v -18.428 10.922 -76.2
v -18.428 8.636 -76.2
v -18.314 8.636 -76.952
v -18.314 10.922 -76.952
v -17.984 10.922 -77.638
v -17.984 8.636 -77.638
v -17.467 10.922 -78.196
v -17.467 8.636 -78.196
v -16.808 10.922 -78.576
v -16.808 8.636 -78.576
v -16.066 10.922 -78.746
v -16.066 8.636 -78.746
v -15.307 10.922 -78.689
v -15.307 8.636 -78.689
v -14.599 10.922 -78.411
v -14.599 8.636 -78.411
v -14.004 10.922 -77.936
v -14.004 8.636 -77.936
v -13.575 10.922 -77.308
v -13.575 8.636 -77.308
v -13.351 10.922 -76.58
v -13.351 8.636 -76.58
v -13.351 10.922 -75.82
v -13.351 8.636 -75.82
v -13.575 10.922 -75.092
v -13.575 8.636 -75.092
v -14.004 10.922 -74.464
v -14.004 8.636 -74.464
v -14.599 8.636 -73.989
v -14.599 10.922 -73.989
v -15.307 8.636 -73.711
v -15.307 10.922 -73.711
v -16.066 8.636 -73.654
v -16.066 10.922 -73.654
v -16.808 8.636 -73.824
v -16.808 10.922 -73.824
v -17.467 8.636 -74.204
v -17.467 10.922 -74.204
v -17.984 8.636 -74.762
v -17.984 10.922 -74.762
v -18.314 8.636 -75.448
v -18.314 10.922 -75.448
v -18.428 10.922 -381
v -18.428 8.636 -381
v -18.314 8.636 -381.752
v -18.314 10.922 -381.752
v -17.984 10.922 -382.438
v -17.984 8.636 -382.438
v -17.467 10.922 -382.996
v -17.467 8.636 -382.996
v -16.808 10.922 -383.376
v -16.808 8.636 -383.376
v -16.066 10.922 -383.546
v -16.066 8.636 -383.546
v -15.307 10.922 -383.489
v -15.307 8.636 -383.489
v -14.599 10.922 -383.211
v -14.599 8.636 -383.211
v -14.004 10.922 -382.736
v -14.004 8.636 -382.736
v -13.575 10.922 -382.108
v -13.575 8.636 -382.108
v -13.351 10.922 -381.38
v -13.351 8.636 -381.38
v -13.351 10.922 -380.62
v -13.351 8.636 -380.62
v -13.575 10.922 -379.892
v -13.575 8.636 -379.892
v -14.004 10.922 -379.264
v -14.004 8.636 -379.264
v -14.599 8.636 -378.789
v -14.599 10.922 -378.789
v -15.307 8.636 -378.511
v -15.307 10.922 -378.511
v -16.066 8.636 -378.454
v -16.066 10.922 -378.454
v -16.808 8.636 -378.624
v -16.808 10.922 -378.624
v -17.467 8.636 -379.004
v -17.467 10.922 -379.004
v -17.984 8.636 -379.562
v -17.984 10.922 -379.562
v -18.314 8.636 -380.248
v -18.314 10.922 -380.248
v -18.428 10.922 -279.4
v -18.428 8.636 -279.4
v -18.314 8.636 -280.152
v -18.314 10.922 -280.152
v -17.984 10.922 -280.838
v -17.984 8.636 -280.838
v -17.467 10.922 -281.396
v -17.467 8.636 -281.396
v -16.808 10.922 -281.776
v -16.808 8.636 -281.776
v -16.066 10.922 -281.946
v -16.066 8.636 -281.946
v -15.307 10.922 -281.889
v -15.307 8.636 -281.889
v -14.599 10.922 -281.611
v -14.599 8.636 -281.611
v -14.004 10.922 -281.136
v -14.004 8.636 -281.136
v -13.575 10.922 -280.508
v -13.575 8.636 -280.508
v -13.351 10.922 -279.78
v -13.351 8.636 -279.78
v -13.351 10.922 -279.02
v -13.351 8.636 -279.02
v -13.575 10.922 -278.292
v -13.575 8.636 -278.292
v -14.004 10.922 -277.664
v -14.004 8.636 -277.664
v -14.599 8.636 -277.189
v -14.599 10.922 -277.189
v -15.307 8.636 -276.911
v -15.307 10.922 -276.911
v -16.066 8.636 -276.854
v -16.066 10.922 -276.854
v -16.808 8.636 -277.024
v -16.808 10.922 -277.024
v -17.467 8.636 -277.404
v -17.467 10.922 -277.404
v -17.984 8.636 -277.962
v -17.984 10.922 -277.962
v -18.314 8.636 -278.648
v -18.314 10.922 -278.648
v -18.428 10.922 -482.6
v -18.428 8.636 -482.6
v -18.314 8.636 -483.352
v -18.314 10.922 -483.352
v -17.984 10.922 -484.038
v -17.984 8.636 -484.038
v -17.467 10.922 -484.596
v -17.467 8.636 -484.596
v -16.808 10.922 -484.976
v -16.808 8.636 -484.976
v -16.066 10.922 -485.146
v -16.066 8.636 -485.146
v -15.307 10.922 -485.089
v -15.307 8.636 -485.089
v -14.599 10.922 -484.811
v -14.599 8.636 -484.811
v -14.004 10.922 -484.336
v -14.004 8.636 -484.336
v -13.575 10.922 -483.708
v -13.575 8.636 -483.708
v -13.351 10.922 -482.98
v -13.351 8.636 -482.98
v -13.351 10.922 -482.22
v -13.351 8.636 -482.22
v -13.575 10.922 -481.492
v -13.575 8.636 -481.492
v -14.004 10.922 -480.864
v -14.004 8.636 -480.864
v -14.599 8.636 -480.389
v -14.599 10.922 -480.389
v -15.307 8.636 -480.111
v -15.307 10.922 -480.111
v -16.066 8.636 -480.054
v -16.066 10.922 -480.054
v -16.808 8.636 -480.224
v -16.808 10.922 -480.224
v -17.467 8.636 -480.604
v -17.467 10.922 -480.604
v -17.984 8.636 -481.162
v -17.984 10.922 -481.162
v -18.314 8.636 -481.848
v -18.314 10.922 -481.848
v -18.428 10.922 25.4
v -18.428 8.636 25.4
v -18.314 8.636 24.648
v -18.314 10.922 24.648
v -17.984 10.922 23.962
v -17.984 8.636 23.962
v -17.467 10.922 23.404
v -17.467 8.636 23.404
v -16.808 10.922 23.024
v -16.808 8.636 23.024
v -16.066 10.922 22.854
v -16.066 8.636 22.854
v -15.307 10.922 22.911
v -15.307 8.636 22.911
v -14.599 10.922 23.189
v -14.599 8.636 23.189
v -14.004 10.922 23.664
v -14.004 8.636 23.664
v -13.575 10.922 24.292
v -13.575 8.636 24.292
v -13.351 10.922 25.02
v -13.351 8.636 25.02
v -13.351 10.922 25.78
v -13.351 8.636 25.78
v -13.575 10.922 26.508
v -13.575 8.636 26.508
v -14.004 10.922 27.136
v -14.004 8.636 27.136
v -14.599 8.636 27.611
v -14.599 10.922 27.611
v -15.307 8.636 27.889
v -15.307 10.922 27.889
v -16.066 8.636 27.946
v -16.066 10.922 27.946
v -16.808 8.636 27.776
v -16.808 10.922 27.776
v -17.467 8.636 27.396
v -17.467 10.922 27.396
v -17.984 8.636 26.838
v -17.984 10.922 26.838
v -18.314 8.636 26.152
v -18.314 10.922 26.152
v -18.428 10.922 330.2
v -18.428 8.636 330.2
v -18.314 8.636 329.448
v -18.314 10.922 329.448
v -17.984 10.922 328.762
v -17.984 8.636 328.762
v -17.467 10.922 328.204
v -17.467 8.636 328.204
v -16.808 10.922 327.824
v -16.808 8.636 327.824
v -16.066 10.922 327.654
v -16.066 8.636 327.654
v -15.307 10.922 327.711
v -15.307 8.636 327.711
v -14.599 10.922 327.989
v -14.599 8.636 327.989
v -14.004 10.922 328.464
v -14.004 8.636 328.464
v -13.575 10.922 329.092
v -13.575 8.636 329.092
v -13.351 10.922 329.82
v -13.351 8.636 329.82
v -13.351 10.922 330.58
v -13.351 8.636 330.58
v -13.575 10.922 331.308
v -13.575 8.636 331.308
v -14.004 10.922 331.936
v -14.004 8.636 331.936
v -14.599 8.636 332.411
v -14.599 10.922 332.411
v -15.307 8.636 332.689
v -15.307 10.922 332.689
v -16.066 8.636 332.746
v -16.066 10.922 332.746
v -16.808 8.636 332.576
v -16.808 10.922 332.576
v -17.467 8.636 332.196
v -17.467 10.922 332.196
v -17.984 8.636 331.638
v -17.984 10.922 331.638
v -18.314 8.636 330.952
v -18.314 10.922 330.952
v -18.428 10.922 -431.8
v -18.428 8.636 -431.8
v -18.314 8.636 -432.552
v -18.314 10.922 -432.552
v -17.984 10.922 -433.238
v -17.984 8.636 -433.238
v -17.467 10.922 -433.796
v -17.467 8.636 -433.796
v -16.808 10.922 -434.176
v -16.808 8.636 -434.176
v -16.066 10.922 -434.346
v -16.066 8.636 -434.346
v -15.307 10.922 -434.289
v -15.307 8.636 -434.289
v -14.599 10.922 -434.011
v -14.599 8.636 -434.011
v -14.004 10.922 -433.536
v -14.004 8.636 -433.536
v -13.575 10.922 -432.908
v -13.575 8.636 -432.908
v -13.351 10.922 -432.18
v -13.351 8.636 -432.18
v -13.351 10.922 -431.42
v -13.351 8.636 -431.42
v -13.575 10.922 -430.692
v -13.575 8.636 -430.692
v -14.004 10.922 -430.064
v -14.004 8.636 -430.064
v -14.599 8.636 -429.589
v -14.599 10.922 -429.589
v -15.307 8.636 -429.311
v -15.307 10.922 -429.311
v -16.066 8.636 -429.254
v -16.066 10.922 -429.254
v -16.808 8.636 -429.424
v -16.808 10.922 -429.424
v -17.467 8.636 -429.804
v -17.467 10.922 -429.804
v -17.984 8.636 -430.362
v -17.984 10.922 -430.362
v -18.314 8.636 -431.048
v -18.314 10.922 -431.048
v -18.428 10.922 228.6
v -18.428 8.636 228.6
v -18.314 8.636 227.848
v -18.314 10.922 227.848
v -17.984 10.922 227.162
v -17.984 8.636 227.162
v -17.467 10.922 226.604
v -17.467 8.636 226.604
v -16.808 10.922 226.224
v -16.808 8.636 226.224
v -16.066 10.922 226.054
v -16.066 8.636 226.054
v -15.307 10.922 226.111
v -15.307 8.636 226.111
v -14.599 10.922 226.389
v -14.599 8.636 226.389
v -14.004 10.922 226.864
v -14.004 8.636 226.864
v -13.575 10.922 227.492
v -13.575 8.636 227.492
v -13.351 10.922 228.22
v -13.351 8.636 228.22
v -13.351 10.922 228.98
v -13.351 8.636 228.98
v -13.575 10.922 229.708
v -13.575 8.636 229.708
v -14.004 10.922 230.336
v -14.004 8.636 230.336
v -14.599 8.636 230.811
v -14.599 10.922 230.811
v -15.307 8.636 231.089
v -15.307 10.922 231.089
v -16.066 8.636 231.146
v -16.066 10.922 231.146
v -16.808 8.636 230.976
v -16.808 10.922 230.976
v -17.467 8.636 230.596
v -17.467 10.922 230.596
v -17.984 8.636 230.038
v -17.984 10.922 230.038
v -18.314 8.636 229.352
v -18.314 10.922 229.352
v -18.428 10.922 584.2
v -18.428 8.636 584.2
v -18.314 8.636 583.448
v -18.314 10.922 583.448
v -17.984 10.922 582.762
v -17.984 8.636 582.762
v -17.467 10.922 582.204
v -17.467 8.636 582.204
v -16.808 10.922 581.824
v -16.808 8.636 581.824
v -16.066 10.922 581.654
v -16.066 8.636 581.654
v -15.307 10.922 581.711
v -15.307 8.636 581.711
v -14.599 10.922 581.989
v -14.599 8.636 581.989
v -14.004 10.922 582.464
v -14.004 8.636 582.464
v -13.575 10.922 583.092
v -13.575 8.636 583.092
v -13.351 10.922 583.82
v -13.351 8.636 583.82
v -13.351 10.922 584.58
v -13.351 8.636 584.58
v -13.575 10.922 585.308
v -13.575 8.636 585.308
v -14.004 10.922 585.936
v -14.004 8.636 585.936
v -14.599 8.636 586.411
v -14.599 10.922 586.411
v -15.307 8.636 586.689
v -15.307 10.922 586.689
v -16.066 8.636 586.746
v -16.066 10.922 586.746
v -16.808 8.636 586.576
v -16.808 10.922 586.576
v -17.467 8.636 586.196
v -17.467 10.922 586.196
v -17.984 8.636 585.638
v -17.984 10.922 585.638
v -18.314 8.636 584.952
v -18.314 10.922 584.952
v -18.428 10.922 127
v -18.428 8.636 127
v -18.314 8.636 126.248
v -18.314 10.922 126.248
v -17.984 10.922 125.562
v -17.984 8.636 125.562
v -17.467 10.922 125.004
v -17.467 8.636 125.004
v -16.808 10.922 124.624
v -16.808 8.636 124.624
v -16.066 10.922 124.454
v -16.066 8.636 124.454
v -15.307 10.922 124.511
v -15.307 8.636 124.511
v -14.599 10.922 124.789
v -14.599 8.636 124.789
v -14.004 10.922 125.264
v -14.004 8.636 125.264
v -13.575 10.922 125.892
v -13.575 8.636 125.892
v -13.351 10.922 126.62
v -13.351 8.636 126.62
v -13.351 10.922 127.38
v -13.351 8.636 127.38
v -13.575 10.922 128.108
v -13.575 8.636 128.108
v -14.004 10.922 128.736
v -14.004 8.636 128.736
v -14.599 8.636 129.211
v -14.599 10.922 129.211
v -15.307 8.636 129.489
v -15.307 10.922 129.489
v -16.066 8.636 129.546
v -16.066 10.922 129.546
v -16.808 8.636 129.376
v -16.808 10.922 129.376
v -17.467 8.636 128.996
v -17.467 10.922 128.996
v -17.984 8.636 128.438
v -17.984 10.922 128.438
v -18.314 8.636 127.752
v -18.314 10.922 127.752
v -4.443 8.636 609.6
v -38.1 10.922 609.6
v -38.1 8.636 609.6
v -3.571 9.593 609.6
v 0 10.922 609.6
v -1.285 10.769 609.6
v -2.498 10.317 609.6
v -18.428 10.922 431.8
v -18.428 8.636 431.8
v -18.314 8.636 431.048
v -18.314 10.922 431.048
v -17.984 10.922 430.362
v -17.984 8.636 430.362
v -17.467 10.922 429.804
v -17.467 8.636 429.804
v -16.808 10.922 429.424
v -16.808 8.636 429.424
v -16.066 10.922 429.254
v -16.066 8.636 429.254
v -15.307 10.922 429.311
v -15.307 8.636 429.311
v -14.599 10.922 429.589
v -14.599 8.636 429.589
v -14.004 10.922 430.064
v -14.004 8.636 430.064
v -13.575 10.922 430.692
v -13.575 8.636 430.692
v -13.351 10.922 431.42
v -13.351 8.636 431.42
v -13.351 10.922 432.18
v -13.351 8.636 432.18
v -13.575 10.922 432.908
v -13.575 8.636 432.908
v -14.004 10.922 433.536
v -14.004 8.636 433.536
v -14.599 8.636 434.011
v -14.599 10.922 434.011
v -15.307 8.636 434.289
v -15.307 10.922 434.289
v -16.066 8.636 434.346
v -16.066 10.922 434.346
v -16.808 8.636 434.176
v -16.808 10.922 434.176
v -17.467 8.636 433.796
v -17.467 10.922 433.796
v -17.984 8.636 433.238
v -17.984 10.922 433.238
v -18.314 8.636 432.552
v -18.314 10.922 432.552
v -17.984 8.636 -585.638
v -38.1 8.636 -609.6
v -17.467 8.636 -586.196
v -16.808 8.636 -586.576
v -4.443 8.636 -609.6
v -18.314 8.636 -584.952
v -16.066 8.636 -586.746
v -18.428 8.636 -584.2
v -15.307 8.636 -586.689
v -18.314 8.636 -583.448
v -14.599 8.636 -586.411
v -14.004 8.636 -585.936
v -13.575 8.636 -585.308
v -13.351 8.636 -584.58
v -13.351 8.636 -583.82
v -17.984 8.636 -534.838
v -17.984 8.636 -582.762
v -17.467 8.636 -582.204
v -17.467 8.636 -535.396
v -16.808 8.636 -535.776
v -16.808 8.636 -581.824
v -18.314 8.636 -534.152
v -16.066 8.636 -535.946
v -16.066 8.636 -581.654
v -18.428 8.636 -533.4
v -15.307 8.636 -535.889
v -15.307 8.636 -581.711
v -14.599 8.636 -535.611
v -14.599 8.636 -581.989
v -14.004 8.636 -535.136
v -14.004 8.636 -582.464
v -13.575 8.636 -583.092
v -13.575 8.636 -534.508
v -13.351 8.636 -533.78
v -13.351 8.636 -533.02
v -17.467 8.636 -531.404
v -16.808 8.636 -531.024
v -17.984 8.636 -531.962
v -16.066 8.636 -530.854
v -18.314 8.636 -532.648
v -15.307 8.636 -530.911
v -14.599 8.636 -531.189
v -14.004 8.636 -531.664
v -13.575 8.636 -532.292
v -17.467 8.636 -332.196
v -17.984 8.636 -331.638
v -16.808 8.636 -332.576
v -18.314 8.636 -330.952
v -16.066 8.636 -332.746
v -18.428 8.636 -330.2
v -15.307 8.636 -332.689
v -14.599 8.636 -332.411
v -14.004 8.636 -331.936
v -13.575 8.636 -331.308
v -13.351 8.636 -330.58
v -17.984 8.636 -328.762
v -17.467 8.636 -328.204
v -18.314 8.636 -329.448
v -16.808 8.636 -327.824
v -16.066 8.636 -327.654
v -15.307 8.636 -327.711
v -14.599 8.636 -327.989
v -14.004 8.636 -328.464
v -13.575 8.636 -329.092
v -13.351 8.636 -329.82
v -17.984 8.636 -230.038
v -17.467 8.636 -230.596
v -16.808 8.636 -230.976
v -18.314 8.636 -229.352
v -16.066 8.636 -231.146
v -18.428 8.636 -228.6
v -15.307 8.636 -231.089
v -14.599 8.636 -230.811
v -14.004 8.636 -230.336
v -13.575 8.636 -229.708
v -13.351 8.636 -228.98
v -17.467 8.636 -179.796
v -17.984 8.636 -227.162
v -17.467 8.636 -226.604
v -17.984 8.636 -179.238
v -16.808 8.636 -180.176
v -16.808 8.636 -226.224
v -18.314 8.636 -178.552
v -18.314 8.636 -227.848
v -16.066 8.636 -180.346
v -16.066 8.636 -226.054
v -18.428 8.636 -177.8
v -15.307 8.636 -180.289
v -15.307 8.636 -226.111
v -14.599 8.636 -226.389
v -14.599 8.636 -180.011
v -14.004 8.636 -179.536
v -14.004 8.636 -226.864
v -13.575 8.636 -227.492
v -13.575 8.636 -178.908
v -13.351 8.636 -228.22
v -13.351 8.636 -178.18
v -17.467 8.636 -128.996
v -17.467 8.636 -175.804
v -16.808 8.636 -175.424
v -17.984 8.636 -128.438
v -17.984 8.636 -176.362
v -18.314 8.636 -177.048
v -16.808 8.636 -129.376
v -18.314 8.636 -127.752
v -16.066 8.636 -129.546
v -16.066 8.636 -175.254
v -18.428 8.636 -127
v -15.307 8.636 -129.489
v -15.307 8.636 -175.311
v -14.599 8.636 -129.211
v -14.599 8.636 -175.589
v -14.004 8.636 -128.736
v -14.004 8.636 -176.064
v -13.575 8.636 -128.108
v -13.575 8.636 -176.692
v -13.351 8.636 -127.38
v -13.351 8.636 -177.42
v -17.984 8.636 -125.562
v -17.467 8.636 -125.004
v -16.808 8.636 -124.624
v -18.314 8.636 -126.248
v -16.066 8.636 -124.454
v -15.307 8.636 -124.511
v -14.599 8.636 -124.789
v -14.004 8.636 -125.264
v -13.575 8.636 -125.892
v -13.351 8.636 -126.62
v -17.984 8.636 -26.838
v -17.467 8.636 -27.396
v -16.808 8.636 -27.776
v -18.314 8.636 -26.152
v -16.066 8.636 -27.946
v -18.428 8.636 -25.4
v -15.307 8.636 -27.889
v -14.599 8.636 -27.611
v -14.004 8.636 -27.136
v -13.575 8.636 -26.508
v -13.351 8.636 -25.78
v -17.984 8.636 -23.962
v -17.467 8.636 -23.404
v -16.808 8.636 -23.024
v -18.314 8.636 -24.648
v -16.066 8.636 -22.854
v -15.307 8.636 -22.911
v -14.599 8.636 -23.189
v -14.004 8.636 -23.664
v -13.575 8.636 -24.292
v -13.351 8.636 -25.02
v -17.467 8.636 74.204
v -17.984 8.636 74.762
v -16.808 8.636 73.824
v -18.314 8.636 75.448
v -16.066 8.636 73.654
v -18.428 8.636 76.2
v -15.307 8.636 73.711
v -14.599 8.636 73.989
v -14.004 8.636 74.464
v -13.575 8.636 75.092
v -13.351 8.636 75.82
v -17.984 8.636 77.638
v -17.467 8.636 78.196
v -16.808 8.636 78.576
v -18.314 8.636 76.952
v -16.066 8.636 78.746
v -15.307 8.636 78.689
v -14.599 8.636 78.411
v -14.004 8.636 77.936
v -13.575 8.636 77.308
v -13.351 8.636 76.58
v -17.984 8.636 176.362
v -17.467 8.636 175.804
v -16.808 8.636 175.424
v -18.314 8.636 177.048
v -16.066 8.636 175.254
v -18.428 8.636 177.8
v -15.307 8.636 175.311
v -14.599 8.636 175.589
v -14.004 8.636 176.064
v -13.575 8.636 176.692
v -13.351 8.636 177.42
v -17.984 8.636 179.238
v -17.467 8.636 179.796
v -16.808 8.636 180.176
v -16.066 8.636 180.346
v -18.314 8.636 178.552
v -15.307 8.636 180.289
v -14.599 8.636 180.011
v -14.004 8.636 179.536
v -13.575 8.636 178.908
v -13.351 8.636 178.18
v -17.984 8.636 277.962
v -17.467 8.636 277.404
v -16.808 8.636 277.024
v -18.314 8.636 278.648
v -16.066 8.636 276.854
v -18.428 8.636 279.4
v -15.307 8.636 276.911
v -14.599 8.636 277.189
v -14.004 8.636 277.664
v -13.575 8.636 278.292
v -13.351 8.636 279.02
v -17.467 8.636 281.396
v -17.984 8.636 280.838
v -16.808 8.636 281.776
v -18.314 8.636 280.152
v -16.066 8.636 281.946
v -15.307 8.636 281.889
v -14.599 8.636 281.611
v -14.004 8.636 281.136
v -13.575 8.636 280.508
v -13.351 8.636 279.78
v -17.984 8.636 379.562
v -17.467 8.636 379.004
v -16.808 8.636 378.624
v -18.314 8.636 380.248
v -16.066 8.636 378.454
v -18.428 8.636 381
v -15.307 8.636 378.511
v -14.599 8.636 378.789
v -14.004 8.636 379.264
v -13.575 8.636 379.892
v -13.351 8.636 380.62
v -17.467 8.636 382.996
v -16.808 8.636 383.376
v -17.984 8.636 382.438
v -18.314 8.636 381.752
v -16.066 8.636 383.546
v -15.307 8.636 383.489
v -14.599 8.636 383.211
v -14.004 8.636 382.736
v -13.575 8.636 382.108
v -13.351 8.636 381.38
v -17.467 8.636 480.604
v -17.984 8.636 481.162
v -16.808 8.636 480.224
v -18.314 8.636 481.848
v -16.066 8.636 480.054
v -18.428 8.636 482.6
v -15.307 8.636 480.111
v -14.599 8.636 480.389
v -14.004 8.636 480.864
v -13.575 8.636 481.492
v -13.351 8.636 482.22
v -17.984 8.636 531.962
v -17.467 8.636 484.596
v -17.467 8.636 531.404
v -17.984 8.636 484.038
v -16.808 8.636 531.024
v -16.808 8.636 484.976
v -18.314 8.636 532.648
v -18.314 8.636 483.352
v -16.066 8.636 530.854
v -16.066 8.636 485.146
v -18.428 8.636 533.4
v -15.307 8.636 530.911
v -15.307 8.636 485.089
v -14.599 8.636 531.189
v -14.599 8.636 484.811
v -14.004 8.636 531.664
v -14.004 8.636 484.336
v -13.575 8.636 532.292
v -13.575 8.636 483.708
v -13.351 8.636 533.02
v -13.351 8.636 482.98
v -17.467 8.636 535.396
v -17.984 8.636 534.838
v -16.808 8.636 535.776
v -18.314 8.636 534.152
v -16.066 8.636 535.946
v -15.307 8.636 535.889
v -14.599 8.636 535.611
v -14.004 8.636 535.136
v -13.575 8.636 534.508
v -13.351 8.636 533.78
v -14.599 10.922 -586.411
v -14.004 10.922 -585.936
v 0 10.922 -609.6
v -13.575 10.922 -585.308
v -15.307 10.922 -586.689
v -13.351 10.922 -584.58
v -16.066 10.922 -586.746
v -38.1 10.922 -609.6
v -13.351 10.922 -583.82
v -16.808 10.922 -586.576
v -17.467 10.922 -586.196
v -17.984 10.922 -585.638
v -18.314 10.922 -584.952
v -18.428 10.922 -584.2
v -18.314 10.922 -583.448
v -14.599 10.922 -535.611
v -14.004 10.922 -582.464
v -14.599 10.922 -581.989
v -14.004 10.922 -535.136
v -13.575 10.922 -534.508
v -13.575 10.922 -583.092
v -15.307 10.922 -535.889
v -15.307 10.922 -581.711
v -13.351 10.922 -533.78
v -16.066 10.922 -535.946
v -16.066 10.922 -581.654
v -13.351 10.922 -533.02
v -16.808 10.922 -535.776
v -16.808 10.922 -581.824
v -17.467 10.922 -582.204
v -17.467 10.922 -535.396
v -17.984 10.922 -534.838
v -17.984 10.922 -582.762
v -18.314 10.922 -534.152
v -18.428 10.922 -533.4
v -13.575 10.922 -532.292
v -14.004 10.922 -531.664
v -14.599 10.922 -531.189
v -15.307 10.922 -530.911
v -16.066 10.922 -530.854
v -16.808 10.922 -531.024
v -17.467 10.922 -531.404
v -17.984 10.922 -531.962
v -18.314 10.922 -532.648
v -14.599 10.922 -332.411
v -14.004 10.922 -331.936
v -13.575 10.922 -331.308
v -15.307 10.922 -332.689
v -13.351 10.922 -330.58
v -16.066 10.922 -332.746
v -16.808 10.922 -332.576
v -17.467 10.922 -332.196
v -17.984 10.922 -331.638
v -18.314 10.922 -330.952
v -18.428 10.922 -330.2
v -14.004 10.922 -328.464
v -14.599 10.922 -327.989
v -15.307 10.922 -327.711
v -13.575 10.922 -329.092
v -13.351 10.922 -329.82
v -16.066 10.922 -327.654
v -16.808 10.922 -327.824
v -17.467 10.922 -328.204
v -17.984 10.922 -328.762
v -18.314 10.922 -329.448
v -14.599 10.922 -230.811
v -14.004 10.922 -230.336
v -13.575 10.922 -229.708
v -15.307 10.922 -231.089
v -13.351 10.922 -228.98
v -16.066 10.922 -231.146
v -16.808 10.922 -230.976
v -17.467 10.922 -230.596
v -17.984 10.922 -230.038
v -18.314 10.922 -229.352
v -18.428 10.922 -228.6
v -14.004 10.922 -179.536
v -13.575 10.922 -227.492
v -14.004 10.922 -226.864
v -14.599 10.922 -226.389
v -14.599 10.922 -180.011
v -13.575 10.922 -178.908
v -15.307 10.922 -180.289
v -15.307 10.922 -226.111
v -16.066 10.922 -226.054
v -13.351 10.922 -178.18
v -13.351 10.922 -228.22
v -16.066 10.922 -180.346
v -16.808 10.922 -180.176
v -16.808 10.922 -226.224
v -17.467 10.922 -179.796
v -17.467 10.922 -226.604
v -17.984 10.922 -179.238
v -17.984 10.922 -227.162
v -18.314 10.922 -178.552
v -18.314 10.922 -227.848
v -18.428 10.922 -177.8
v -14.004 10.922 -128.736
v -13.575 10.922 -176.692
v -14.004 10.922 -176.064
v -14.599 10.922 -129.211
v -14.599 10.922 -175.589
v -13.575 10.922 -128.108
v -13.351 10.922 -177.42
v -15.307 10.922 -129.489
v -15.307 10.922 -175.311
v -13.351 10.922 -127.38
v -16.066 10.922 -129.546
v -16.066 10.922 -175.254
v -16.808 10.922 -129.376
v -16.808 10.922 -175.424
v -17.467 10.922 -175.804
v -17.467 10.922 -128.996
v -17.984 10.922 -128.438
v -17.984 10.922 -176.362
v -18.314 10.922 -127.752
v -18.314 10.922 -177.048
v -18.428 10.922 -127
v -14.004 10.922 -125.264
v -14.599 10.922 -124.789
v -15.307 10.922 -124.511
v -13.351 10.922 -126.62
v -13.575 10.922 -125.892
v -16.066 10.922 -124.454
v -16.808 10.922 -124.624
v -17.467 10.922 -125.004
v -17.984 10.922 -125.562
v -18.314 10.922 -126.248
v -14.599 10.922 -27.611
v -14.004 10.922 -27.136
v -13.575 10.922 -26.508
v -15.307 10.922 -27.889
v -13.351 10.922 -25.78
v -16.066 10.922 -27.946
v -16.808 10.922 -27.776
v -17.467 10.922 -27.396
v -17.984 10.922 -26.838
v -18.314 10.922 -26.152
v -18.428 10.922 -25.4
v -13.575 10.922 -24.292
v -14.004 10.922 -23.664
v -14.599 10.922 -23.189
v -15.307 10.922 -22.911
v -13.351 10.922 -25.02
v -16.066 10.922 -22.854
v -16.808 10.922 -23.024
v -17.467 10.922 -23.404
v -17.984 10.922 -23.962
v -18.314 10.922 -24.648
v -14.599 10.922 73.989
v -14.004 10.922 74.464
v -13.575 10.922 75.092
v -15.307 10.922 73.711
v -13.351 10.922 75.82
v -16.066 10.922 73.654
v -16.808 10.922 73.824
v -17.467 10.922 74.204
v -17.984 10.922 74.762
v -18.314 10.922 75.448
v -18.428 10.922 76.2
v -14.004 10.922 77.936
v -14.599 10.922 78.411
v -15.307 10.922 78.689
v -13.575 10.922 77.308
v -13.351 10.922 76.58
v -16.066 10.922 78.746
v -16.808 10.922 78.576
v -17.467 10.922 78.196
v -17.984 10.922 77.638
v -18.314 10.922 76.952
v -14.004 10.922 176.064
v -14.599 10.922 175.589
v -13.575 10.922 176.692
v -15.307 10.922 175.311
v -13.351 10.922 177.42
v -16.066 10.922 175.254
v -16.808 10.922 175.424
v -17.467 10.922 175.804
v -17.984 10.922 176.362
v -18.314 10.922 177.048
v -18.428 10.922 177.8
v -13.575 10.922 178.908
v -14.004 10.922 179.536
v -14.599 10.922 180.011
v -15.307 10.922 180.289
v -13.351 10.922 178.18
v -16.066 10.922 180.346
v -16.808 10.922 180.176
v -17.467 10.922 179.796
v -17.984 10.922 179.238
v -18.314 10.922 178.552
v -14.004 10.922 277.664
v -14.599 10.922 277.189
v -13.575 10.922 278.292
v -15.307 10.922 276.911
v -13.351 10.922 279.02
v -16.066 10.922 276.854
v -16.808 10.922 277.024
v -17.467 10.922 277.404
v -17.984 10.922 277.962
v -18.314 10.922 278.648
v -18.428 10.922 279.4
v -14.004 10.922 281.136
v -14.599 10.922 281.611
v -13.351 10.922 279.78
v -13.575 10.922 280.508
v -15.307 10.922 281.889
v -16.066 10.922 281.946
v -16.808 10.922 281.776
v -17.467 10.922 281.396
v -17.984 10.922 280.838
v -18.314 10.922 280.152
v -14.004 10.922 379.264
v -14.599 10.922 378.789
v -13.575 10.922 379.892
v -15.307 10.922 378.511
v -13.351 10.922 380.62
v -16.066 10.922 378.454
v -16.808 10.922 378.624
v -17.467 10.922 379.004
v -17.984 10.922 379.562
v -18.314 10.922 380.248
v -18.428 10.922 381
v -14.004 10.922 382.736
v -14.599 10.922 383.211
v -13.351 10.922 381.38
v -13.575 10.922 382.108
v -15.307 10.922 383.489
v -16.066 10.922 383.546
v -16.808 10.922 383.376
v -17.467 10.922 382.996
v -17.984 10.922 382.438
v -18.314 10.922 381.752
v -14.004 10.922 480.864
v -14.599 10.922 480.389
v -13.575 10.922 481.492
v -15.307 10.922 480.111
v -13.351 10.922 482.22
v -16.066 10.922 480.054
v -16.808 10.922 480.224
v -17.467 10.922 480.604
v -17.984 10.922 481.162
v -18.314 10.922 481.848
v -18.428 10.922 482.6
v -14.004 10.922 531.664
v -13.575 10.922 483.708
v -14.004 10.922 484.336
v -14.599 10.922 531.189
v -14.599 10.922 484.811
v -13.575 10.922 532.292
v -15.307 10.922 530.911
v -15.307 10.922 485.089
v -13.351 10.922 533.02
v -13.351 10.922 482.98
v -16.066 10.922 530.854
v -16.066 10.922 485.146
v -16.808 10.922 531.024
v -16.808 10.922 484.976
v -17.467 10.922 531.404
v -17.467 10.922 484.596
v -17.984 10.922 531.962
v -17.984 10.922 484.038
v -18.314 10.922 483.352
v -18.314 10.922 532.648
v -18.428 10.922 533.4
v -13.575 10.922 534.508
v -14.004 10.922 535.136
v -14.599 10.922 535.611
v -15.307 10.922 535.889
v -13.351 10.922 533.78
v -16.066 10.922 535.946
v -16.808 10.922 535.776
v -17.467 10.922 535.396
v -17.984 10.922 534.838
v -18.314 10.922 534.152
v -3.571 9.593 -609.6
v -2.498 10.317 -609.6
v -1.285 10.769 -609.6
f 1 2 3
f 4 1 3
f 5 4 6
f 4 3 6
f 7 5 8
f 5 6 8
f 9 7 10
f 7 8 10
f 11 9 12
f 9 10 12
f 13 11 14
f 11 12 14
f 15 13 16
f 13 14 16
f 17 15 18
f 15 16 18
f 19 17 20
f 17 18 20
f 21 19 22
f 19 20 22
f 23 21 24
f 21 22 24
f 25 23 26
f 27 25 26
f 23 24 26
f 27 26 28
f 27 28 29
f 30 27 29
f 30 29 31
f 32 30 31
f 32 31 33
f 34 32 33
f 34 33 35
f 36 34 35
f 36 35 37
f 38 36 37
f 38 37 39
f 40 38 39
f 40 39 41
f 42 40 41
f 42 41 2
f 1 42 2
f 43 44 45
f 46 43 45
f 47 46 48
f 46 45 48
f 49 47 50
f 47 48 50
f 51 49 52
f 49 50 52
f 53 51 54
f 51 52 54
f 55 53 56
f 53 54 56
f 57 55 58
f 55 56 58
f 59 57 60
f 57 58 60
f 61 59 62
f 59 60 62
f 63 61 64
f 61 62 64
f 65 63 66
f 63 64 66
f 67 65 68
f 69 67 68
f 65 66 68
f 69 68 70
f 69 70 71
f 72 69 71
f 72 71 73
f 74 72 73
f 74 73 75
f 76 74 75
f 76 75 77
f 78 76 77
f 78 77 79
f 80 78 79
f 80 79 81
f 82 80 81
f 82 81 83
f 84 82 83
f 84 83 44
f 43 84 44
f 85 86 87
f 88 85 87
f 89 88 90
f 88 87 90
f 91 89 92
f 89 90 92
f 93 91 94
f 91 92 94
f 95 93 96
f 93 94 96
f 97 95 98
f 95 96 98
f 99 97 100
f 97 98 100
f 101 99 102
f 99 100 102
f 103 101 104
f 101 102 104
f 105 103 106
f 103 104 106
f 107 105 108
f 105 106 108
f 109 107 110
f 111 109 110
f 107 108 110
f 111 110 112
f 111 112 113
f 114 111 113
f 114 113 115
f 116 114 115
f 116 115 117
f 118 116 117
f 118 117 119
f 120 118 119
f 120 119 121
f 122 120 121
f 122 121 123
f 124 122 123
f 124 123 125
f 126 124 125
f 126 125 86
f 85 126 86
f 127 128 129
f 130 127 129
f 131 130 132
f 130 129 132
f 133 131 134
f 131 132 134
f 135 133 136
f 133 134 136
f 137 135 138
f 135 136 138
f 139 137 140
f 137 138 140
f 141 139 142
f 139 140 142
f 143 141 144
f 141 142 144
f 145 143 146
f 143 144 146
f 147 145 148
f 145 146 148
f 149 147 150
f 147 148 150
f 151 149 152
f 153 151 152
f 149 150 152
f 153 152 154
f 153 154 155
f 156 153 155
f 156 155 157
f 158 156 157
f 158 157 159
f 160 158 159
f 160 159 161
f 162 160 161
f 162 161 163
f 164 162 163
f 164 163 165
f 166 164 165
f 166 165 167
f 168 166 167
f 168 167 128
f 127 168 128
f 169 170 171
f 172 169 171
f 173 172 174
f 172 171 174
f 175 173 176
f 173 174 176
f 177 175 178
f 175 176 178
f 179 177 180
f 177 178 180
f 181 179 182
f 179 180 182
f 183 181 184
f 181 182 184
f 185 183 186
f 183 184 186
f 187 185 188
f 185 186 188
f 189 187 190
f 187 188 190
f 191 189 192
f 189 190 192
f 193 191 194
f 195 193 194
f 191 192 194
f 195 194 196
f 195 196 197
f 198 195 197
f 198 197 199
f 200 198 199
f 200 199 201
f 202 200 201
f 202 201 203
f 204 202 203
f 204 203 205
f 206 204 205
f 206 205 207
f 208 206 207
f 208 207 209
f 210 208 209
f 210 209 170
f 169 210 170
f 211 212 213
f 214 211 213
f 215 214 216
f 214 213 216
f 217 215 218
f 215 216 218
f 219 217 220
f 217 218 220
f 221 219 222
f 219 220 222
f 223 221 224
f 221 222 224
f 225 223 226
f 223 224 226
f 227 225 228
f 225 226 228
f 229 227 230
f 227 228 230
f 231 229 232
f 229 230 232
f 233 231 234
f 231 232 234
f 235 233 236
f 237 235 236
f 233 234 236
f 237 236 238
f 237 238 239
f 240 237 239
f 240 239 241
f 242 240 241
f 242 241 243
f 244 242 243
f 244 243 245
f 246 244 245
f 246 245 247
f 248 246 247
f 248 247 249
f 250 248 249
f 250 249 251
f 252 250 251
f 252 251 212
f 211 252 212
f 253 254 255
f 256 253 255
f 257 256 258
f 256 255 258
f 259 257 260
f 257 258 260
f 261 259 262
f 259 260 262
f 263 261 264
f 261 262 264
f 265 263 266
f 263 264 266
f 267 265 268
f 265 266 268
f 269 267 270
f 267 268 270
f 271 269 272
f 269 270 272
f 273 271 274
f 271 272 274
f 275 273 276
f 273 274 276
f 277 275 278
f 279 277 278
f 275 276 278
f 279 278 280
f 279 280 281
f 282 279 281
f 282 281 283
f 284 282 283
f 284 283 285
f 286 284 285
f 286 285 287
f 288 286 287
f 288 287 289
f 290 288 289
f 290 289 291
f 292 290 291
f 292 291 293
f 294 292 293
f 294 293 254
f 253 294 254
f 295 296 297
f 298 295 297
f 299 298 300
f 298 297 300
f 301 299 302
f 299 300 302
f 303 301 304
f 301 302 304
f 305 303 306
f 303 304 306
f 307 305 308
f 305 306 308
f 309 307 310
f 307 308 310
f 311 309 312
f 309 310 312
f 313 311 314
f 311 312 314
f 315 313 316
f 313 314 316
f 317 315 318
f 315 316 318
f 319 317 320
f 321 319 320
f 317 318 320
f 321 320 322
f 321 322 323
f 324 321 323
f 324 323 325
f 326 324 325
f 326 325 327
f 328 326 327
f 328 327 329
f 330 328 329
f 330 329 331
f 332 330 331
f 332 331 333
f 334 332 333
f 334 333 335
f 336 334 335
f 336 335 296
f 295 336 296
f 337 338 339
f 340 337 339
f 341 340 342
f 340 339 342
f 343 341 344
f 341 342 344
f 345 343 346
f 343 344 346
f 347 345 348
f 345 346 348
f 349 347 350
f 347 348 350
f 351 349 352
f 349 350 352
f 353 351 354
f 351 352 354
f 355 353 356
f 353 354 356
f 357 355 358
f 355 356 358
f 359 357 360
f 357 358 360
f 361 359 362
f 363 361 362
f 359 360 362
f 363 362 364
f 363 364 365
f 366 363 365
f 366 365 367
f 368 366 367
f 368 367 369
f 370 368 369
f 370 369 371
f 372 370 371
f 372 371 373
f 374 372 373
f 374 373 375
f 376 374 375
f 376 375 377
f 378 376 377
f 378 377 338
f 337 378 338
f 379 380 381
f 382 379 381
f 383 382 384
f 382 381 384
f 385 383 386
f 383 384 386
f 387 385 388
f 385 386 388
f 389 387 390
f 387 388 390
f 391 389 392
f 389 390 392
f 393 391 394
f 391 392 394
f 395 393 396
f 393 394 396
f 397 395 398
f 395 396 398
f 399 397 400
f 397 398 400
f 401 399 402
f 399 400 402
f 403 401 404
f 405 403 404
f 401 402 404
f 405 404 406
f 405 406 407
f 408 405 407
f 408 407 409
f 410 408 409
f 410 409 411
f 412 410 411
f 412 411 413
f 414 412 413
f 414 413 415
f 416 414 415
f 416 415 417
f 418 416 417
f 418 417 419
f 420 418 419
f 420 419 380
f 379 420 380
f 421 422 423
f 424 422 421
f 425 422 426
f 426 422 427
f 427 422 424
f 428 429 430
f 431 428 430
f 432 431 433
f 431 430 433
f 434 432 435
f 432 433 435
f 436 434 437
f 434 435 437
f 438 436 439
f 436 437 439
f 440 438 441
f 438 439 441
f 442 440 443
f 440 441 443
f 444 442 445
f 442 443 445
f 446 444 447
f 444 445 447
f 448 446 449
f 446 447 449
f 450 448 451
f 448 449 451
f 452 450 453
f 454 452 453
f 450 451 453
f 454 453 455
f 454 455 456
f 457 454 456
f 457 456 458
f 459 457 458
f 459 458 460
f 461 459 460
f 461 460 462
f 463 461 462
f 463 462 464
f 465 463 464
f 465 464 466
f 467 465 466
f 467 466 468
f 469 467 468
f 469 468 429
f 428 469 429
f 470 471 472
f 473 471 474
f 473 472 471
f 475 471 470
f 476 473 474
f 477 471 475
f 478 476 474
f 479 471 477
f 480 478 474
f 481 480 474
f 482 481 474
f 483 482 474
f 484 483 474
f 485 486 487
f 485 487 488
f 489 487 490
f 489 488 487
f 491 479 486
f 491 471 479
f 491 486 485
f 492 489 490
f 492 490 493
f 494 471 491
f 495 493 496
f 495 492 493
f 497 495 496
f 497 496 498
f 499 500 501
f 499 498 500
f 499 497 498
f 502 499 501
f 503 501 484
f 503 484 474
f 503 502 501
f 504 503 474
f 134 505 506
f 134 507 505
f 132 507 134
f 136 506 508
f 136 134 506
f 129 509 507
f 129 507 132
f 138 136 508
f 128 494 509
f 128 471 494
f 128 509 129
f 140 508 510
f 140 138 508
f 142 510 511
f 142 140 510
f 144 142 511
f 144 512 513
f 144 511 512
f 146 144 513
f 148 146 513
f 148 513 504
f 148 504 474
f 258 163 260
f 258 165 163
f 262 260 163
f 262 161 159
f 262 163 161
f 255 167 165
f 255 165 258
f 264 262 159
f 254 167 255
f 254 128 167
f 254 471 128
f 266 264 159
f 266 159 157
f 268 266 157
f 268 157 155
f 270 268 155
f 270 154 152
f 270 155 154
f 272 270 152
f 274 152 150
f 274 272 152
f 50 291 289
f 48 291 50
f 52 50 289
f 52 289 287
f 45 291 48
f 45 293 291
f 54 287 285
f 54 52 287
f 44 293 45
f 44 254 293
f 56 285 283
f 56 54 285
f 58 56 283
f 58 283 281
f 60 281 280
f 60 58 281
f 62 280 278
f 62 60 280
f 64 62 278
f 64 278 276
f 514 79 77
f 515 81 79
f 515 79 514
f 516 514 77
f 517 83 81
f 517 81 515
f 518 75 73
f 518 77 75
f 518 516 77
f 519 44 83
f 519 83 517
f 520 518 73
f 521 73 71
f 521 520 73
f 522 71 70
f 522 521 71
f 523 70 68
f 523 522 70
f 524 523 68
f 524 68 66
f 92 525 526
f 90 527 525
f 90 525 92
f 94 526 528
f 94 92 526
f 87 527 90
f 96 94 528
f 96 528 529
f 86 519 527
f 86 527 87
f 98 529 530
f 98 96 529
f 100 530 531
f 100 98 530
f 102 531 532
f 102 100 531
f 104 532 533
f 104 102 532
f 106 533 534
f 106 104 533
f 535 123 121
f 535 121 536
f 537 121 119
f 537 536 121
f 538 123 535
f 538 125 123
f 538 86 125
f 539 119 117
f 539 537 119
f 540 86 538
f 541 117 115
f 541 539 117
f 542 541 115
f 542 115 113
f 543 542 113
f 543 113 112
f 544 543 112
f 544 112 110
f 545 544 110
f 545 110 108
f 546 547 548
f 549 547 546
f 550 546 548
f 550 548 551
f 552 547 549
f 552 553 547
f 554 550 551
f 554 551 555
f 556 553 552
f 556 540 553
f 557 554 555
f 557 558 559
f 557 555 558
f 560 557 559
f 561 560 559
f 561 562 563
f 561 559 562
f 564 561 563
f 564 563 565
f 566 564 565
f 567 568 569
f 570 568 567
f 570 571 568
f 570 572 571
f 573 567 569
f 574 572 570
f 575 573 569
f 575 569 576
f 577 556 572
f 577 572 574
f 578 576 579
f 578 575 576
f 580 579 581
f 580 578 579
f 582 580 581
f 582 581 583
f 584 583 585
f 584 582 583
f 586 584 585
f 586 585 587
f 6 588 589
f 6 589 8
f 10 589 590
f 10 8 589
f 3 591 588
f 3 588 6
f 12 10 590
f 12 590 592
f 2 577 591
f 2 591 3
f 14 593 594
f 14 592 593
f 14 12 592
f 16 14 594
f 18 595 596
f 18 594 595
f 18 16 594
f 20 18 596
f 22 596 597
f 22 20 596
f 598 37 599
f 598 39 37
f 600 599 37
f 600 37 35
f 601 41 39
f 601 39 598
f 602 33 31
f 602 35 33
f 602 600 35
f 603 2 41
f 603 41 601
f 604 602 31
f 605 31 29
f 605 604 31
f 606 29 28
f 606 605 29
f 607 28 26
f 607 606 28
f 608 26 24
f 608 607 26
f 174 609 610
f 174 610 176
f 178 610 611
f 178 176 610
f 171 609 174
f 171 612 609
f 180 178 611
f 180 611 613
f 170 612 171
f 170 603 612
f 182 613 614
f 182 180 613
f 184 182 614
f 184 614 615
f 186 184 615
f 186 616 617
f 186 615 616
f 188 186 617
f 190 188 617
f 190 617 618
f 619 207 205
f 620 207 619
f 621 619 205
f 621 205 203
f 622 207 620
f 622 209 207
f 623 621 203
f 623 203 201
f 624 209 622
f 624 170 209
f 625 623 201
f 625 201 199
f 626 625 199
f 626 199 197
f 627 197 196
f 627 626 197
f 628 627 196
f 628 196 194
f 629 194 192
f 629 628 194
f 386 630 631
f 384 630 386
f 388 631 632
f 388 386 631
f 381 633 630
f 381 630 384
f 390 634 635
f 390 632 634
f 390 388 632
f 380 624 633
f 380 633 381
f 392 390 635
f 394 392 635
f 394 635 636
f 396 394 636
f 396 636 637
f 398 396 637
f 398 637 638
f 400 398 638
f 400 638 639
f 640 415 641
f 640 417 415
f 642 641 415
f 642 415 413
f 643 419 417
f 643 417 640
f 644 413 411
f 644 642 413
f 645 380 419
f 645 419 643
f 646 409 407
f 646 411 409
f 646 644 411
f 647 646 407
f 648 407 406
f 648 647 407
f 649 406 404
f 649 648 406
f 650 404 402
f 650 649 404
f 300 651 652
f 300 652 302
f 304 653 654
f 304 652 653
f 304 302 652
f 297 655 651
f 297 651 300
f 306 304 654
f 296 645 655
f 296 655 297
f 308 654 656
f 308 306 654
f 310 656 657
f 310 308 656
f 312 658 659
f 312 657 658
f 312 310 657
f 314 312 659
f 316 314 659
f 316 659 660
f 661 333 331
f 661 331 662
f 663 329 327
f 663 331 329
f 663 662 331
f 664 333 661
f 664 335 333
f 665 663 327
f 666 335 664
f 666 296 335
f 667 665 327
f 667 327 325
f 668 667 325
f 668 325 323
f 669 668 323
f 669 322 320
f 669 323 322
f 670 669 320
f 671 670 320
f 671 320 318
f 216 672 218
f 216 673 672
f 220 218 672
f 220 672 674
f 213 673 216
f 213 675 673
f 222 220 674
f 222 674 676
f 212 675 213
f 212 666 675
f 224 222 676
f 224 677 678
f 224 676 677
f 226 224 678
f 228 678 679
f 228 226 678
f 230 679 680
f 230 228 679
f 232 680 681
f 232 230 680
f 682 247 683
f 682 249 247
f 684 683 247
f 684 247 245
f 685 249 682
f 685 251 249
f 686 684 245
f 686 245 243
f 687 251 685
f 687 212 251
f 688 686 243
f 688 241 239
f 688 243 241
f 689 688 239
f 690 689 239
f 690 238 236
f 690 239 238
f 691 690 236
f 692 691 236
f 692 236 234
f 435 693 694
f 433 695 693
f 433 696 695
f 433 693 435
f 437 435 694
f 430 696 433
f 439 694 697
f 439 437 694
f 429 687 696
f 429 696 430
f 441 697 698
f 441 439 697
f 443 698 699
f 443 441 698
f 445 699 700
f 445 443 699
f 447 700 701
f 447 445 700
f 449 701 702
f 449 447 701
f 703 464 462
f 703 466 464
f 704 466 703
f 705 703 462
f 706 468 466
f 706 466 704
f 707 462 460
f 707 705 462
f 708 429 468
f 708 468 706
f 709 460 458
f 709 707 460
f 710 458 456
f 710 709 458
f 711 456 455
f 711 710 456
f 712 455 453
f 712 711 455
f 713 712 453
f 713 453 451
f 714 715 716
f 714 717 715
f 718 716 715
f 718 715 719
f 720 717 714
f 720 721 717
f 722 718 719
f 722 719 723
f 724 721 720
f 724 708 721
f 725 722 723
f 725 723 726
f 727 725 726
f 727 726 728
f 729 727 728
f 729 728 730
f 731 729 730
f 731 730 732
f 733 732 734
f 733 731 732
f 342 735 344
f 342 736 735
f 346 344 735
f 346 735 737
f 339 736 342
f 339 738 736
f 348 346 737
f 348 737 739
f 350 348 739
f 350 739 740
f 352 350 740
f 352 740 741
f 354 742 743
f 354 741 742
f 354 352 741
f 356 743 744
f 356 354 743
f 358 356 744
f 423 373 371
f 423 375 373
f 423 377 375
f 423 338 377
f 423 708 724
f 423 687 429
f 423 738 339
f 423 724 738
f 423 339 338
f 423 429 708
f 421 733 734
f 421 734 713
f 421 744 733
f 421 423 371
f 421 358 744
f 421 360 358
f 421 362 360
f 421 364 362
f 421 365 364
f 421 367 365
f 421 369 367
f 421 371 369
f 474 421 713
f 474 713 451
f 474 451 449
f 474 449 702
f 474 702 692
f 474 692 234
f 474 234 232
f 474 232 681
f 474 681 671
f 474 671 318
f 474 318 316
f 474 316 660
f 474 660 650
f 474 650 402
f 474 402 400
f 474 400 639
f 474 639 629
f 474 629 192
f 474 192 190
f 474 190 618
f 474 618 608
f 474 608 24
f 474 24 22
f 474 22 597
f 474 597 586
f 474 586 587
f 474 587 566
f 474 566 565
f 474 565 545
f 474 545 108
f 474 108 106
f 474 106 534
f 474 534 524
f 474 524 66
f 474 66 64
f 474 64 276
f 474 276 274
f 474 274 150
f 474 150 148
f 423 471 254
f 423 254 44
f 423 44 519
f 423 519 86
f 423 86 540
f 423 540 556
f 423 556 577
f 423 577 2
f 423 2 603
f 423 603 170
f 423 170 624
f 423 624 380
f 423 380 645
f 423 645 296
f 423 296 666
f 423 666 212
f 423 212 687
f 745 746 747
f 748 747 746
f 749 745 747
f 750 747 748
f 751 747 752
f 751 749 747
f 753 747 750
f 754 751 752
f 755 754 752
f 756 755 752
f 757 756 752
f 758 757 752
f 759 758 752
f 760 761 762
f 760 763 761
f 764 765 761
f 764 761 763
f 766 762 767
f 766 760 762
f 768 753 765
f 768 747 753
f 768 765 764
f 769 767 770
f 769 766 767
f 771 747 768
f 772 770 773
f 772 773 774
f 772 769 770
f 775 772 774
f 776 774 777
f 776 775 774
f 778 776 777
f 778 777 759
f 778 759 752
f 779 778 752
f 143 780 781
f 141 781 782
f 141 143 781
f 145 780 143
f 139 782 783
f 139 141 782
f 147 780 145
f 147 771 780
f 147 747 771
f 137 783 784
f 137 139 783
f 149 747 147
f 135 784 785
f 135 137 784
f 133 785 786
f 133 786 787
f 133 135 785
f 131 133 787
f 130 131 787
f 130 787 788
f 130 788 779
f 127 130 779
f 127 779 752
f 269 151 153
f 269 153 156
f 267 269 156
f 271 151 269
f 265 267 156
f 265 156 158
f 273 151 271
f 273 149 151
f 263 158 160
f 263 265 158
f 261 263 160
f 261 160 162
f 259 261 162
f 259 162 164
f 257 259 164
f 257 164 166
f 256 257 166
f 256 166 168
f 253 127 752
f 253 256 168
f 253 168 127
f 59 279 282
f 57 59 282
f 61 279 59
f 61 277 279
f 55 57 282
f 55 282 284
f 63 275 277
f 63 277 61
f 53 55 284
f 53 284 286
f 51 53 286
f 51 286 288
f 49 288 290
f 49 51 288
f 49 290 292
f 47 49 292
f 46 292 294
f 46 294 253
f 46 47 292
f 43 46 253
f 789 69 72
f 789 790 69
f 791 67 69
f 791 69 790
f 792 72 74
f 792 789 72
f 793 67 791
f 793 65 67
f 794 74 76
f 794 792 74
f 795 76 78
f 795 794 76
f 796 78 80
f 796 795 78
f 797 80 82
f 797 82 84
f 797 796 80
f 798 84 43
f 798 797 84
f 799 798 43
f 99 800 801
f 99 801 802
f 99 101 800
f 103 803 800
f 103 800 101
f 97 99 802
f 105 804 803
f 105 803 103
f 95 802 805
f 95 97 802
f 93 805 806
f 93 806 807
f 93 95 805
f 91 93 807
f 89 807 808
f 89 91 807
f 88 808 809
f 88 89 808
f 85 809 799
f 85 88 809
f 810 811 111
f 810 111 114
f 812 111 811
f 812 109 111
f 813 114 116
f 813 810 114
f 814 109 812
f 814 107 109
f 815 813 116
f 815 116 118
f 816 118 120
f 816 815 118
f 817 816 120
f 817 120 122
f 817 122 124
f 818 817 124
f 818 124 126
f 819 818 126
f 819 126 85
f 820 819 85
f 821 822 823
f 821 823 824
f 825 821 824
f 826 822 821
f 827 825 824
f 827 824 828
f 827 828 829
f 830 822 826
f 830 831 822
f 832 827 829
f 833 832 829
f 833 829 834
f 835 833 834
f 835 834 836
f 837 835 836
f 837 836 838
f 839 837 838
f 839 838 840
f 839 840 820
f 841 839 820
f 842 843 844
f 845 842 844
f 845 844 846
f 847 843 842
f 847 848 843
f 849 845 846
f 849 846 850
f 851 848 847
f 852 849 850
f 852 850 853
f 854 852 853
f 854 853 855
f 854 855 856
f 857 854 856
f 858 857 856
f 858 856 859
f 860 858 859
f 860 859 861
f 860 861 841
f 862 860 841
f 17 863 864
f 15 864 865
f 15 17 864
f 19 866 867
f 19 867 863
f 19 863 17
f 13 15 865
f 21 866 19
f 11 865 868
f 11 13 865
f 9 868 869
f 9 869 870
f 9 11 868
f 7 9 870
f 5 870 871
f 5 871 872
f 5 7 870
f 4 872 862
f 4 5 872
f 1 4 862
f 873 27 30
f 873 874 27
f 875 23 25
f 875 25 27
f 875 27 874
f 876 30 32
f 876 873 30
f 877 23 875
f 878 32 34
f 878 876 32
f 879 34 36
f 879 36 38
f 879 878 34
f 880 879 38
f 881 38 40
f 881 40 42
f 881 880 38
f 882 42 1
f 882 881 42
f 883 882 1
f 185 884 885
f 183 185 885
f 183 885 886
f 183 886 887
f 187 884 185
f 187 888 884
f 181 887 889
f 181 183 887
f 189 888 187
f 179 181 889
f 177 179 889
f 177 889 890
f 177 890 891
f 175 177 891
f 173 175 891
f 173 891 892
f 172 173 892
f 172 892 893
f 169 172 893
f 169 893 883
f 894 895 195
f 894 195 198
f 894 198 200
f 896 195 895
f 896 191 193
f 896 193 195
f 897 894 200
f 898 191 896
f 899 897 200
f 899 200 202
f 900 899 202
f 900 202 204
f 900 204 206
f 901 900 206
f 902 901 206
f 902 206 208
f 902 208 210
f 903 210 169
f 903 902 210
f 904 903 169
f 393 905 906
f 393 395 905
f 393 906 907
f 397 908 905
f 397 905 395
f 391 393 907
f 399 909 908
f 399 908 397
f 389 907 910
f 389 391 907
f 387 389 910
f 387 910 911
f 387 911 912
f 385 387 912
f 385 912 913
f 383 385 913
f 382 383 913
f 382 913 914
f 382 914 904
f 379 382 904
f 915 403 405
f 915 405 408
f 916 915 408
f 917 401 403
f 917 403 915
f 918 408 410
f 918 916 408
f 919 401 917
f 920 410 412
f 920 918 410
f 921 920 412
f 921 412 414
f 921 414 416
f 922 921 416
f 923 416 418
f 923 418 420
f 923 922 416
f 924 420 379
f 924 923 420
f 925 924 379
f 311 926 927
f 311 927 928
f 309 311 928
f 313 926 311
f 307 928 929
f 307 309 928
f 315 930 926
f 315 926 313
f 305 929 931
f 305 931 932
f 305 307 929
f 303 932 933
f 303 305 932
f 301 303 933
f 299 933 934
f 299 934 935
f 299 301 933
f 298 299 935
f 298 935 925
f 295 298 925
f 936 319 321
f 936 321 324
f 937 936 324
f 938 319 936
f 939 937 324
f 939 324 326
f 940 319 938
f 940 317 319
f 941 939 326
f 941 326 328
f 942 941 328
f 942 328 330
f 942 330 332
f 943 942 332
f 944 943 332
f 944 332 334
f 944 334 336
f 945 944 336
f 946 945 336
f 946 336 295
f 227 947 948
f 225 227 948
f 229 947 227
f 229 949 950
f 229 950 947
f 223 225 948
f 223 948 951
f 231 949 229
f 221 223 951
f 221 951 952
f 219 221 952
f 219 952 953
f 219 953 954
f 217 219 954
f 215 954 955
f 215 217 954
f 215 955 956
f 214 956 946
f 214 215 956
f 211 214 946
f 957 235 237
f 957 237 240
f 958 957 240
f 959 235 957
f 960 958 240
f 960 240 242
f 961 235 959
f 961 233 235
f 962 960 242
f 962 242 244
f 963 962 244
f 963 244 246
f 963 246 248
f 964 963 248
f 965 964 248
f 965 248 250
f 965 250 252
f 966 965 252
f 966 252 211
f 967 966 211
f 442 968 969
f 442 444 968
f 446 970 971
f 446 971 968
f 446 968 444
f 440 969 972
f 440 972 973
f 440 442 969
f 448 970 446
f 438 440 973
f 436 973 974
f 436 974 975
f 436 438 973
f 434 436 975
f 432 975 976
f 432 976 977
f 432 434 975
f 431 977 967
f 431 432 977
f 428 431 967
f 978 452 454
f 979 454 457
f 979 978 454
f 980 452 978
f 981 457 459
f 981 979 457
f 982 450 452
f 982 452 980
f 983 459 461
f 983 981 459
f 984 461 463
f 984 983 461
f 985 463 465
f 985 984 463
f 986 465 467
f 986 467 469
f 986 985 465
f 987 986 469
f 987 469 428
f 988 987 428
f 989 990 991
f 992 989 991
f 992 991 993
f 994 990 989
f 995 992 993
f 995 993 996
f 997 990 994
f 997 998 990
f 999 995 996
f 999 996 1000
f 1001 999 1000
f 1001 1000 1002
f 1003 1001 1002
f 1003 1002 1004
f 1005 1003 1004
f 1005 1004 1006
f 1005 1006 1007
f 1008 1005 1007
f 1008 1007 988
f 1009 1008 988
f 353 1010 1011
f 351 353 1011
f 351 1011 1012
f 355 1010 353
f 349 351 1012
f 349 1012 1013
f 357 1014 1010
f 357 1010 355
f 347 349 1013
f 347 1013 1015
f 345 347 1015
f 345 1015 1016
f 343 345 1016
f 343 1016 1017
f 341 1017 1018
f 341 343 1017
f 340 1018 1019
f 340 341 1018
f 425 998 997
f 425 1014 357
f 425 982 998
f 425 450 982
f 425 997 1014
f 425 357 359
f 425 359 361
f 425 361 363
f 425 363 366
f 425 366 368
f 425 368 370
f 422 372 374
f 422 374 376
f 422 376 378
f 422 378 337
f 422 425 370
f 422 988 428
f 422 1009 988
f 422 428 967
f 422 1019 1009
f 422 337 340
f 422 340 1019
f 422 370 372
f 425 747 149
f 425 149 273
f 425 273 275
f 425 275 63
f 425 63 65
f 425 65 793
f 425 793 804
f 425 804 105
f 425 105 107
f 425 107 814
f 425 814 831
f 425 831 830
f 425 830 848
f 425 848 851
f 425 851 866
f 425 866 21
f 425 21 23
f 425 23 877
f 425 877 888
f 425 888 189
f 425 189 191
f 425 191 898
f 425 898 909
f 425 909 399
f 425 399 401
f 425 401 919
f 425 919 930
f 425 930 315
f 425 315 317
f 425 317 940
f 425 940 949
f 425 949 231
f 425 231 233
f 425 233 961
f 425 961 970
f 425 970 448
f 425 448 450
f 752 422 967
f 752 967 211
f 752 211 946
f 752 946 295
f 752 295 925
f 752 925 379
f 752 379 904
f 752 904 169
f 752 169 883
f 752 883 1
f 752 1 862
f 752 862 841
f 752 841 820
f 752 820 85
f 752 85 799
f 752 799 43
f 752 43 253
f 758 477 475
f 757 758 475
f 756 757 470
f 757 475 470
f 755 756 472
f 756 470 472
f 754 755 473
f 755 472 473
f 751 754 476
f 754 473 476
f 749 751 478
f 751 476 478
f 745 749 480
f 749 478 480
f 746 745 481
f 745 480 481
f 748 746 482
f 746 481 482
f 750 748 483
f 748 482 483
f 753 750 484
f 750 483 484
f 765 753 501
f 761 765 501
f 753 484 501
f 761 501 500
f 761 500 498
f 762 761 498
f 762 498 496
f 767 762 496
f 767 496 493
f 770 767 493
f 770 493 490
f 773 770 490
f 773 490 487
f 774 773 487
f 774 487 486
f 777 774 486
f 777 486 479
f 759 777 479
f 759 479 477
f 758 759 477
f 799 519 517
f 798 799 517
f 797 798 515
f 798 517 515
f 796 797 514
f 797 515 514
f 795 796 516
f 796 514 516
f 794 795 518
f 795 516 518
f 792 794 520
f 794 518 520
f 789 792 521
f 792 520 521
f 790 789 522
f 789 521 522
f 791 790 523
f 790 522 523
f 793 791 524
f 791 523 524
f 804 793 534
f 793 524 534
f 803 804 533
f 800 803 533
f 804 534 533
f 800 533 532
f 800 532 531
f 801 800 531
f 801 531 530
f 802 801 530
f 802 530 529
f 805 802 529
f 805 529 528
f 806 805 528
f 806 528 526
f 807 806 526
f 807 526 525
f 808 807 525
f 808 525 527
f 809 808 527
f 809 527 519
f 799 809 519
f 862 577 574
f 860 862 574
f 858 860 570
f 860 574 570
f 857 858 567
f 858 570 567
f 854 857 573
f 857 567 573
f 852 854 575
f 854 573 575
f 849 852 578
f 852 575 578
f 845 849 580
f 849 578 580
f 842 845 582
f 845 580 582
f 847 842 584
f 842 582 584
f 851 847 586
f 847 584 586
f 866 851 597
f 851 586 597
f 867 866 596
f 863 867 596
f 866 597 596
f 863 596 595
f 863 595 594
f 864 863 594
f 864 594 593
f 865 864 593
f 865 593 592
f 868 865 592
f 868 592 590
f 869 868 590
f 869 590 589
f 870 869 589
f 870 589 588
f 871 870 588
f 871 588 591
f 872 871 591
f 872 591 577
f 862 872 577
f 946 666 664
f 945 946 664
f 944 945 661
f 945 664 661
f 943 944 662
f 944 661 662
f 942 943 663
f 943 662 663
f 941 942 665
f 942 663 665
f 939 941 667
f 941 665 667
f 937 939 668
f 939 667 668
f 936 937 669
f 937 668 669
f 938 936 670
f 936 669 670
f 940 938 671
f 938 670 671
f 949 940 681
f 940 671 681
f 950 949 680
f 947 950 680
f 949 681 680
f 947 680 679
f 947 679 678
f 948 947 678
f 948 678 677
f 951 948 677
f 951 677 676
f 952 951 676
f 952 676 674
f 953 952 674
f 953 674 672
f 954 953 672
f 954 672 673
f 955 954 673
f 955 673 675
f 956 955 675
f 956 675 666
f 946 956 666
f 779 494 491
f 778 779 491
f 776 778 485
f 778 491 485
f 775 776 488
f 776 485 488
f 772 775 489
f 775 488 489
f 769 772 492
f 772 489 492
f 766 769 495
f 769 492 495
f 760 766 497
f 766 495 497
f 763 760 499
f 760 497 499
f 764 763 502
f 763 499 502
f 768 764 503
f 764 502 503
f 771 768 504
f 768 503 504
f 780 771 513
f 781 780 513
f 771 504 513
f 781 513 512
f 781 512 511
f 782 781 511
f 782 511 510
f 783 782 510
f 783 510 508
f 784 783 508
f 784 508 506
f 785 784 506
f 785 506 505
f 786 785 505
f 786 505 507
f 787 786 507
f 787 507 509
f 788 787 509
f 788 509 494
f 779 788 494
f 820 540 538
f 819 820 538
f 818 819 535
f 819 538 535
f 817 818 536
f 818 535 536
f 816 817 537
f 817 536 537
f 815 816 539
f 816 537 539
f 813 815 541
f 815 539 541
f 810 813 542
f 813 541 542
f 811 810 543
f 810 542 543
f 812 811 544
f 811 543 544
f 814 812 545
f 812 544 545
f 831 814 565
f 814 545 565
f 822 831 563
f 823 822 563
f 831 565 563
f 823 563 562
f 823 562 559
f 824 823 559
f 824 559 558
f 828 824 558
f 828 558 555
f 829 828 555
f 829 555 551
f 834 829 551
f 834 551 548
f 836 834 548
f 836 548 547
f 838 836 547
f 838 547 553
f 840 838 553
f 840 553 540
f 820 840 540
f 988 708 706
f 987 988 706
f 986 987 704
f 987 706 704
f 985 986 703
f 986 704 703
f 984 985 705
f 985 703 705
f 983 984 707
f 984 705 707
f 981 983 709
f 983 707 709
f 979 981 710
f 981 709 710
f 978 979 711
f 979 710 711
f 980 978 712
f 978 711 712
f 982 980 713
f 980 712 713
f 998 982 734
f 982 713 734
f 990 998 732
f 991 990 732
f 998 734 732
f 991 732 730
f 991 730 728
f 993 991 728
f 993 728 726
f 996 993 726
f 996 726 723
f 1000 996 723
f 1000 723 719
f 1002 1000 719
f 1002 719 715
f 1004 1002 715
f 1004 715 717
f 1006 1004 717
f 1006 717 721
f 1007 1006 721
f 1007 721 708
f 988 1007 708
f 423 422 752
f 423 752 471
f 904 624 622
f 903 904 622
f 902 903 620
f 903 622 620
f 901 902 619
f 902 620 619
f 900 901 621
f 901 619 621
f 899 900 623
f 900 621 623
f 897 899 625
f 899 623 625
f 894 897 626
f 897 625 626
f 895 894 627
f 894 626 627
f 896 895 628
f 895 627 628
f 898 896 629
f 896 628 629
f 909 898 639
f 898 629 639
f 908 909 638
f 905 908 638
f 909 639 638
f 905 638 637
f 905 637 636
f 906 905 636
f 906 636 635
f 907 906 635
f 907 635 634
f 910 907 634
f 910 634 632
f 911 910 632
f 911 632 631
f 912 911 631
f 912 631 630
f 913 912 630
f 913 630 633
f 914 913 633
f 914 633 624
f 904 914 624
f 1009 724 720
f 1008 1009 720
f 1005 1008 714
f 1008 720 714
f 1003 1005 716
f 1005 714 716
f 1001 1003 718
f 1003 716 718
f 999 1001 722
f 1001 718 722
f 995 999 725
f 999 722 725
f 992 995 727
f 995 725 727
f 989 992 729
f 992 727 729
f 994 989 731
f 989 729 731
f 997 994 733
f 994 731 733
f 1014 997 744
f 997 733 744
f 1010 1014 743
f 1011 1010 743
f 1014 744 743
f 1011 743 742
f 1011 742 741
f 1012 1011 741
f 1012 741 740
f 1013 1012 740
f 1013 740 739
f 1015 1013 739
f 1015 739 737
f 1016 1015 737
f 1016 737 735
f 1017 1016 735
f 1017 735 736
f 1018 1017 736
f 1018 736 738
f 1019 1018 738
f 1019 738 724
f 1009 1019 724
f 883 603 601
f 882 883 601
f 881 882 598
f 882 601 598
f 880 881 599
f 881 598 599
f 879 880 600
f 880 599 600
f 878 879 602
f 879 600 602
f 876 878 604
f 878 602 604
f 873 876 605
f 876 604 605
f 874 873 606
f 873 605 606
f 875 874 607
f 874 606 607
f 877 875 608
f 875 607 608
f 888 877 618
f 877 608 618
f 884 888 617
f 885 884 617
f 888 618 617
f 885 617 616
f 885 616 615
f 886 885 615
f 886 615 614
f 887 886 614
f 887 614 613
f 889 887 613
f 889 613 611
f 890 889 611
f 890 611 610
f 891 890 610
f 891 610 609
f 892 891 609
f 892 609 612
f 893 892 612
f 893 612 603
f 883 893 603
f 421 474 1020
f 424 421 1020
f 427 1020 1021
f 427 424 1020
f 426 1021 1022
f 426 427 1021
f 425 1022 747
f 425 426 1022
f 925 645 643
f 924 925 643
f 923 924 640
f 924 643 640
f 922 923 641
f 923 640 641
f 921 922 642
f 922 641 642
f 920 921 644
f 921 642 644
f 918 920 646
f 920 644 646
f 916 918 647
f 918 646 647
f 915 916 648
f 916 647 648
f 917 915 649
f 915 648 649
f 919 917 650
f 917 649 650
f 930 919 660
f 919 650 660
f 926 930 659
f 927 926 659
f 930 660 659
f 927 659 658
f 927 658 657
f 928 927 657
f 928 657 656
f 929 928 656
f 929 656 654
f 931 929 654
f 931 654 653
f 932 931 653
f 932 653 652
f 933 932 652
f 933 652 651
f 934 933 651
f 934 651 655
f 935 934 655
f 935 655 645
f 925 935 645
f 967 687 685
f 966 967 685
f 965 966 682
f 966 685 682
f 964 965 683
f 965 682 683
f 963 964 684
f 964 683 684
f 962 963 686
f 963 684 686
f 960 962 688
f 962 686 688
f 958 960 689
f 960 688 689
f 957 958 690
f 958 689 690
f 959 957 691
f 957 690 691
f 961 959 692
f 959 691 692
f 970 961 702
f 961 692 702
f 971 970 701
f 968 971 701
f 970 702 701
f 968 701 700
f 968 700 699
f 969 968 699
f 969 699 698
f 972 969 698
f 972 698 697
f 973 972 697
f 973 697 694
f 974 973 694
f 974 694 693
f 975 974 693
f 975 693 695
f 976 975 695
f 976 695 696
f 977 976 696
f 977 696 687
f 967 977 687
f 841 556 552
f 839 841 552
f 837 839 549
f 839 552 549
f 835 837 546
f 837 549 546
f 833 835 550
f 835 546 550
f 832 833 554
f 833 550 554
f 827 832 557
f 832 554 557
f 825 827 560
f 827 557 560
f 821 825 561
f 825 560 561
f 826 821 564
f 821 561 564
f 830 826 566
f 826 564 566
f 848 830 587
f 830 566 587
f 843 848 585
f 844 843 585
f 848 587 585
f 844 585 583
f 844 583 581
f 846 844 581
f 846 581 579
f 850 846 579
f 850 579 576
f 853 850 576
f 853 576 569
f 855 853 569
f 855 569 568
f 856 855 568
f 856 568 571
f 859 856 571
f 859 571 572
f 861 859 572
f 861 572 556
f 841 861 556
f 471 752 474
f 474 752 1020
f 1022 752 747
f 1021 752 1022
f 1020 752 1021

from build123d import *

# Parameters (mm, degrees)
BOSS_EXTRUDE3_DEPTH    = 609.6
F_10_CLEARANCE_HOLE3_D = 5.1054
LPATTERN1_COUNT        = 24
LPATTERN1_PITCH        = 50.8


with BuildPart() as part:
    # Sketch1<4> → Boss-Extrude3 (new, symmetric)
    with BuildSketch(Plane.XY):
        with BuildLine():
            ThreePointArc((-4.443185344, 8.636), (-2.498384078, 10.316985791), (0, 10.922))
            Line((0, 10.922), (-38.1, 10.922))
            Line((-38.1, 10.922), (-38.1, 8.636))
            Line((-38.1, 8.636), (-4.443185344, 8.636))
        make_face()
    extrude(amount=BOSS_EXTRUDE3_DEPTH, both=True)

    # #10 Clearance Hole3 (through all)
    with Locations(Plane(origin=(0, 10.922, 0), x_dir=(1, 0, 0), z_dir=(0, 1, 0))):
        with Locations((-15.875, -584.2)):
            f_10_clearance_hole3 = Hole(F_10_CLEARANCE_HOLE3_D / 2)

    # LPattern1: #10 Clearance Hole3 ×24
    with Locations(*[(0, 0, -i * LPATTERN1_PITCH) for i in range(1, LPATTERN1_COUNT)]):
        add(f_10_clearance_hole3, mode=Mode.SUBTRACT)


solid = part.part
